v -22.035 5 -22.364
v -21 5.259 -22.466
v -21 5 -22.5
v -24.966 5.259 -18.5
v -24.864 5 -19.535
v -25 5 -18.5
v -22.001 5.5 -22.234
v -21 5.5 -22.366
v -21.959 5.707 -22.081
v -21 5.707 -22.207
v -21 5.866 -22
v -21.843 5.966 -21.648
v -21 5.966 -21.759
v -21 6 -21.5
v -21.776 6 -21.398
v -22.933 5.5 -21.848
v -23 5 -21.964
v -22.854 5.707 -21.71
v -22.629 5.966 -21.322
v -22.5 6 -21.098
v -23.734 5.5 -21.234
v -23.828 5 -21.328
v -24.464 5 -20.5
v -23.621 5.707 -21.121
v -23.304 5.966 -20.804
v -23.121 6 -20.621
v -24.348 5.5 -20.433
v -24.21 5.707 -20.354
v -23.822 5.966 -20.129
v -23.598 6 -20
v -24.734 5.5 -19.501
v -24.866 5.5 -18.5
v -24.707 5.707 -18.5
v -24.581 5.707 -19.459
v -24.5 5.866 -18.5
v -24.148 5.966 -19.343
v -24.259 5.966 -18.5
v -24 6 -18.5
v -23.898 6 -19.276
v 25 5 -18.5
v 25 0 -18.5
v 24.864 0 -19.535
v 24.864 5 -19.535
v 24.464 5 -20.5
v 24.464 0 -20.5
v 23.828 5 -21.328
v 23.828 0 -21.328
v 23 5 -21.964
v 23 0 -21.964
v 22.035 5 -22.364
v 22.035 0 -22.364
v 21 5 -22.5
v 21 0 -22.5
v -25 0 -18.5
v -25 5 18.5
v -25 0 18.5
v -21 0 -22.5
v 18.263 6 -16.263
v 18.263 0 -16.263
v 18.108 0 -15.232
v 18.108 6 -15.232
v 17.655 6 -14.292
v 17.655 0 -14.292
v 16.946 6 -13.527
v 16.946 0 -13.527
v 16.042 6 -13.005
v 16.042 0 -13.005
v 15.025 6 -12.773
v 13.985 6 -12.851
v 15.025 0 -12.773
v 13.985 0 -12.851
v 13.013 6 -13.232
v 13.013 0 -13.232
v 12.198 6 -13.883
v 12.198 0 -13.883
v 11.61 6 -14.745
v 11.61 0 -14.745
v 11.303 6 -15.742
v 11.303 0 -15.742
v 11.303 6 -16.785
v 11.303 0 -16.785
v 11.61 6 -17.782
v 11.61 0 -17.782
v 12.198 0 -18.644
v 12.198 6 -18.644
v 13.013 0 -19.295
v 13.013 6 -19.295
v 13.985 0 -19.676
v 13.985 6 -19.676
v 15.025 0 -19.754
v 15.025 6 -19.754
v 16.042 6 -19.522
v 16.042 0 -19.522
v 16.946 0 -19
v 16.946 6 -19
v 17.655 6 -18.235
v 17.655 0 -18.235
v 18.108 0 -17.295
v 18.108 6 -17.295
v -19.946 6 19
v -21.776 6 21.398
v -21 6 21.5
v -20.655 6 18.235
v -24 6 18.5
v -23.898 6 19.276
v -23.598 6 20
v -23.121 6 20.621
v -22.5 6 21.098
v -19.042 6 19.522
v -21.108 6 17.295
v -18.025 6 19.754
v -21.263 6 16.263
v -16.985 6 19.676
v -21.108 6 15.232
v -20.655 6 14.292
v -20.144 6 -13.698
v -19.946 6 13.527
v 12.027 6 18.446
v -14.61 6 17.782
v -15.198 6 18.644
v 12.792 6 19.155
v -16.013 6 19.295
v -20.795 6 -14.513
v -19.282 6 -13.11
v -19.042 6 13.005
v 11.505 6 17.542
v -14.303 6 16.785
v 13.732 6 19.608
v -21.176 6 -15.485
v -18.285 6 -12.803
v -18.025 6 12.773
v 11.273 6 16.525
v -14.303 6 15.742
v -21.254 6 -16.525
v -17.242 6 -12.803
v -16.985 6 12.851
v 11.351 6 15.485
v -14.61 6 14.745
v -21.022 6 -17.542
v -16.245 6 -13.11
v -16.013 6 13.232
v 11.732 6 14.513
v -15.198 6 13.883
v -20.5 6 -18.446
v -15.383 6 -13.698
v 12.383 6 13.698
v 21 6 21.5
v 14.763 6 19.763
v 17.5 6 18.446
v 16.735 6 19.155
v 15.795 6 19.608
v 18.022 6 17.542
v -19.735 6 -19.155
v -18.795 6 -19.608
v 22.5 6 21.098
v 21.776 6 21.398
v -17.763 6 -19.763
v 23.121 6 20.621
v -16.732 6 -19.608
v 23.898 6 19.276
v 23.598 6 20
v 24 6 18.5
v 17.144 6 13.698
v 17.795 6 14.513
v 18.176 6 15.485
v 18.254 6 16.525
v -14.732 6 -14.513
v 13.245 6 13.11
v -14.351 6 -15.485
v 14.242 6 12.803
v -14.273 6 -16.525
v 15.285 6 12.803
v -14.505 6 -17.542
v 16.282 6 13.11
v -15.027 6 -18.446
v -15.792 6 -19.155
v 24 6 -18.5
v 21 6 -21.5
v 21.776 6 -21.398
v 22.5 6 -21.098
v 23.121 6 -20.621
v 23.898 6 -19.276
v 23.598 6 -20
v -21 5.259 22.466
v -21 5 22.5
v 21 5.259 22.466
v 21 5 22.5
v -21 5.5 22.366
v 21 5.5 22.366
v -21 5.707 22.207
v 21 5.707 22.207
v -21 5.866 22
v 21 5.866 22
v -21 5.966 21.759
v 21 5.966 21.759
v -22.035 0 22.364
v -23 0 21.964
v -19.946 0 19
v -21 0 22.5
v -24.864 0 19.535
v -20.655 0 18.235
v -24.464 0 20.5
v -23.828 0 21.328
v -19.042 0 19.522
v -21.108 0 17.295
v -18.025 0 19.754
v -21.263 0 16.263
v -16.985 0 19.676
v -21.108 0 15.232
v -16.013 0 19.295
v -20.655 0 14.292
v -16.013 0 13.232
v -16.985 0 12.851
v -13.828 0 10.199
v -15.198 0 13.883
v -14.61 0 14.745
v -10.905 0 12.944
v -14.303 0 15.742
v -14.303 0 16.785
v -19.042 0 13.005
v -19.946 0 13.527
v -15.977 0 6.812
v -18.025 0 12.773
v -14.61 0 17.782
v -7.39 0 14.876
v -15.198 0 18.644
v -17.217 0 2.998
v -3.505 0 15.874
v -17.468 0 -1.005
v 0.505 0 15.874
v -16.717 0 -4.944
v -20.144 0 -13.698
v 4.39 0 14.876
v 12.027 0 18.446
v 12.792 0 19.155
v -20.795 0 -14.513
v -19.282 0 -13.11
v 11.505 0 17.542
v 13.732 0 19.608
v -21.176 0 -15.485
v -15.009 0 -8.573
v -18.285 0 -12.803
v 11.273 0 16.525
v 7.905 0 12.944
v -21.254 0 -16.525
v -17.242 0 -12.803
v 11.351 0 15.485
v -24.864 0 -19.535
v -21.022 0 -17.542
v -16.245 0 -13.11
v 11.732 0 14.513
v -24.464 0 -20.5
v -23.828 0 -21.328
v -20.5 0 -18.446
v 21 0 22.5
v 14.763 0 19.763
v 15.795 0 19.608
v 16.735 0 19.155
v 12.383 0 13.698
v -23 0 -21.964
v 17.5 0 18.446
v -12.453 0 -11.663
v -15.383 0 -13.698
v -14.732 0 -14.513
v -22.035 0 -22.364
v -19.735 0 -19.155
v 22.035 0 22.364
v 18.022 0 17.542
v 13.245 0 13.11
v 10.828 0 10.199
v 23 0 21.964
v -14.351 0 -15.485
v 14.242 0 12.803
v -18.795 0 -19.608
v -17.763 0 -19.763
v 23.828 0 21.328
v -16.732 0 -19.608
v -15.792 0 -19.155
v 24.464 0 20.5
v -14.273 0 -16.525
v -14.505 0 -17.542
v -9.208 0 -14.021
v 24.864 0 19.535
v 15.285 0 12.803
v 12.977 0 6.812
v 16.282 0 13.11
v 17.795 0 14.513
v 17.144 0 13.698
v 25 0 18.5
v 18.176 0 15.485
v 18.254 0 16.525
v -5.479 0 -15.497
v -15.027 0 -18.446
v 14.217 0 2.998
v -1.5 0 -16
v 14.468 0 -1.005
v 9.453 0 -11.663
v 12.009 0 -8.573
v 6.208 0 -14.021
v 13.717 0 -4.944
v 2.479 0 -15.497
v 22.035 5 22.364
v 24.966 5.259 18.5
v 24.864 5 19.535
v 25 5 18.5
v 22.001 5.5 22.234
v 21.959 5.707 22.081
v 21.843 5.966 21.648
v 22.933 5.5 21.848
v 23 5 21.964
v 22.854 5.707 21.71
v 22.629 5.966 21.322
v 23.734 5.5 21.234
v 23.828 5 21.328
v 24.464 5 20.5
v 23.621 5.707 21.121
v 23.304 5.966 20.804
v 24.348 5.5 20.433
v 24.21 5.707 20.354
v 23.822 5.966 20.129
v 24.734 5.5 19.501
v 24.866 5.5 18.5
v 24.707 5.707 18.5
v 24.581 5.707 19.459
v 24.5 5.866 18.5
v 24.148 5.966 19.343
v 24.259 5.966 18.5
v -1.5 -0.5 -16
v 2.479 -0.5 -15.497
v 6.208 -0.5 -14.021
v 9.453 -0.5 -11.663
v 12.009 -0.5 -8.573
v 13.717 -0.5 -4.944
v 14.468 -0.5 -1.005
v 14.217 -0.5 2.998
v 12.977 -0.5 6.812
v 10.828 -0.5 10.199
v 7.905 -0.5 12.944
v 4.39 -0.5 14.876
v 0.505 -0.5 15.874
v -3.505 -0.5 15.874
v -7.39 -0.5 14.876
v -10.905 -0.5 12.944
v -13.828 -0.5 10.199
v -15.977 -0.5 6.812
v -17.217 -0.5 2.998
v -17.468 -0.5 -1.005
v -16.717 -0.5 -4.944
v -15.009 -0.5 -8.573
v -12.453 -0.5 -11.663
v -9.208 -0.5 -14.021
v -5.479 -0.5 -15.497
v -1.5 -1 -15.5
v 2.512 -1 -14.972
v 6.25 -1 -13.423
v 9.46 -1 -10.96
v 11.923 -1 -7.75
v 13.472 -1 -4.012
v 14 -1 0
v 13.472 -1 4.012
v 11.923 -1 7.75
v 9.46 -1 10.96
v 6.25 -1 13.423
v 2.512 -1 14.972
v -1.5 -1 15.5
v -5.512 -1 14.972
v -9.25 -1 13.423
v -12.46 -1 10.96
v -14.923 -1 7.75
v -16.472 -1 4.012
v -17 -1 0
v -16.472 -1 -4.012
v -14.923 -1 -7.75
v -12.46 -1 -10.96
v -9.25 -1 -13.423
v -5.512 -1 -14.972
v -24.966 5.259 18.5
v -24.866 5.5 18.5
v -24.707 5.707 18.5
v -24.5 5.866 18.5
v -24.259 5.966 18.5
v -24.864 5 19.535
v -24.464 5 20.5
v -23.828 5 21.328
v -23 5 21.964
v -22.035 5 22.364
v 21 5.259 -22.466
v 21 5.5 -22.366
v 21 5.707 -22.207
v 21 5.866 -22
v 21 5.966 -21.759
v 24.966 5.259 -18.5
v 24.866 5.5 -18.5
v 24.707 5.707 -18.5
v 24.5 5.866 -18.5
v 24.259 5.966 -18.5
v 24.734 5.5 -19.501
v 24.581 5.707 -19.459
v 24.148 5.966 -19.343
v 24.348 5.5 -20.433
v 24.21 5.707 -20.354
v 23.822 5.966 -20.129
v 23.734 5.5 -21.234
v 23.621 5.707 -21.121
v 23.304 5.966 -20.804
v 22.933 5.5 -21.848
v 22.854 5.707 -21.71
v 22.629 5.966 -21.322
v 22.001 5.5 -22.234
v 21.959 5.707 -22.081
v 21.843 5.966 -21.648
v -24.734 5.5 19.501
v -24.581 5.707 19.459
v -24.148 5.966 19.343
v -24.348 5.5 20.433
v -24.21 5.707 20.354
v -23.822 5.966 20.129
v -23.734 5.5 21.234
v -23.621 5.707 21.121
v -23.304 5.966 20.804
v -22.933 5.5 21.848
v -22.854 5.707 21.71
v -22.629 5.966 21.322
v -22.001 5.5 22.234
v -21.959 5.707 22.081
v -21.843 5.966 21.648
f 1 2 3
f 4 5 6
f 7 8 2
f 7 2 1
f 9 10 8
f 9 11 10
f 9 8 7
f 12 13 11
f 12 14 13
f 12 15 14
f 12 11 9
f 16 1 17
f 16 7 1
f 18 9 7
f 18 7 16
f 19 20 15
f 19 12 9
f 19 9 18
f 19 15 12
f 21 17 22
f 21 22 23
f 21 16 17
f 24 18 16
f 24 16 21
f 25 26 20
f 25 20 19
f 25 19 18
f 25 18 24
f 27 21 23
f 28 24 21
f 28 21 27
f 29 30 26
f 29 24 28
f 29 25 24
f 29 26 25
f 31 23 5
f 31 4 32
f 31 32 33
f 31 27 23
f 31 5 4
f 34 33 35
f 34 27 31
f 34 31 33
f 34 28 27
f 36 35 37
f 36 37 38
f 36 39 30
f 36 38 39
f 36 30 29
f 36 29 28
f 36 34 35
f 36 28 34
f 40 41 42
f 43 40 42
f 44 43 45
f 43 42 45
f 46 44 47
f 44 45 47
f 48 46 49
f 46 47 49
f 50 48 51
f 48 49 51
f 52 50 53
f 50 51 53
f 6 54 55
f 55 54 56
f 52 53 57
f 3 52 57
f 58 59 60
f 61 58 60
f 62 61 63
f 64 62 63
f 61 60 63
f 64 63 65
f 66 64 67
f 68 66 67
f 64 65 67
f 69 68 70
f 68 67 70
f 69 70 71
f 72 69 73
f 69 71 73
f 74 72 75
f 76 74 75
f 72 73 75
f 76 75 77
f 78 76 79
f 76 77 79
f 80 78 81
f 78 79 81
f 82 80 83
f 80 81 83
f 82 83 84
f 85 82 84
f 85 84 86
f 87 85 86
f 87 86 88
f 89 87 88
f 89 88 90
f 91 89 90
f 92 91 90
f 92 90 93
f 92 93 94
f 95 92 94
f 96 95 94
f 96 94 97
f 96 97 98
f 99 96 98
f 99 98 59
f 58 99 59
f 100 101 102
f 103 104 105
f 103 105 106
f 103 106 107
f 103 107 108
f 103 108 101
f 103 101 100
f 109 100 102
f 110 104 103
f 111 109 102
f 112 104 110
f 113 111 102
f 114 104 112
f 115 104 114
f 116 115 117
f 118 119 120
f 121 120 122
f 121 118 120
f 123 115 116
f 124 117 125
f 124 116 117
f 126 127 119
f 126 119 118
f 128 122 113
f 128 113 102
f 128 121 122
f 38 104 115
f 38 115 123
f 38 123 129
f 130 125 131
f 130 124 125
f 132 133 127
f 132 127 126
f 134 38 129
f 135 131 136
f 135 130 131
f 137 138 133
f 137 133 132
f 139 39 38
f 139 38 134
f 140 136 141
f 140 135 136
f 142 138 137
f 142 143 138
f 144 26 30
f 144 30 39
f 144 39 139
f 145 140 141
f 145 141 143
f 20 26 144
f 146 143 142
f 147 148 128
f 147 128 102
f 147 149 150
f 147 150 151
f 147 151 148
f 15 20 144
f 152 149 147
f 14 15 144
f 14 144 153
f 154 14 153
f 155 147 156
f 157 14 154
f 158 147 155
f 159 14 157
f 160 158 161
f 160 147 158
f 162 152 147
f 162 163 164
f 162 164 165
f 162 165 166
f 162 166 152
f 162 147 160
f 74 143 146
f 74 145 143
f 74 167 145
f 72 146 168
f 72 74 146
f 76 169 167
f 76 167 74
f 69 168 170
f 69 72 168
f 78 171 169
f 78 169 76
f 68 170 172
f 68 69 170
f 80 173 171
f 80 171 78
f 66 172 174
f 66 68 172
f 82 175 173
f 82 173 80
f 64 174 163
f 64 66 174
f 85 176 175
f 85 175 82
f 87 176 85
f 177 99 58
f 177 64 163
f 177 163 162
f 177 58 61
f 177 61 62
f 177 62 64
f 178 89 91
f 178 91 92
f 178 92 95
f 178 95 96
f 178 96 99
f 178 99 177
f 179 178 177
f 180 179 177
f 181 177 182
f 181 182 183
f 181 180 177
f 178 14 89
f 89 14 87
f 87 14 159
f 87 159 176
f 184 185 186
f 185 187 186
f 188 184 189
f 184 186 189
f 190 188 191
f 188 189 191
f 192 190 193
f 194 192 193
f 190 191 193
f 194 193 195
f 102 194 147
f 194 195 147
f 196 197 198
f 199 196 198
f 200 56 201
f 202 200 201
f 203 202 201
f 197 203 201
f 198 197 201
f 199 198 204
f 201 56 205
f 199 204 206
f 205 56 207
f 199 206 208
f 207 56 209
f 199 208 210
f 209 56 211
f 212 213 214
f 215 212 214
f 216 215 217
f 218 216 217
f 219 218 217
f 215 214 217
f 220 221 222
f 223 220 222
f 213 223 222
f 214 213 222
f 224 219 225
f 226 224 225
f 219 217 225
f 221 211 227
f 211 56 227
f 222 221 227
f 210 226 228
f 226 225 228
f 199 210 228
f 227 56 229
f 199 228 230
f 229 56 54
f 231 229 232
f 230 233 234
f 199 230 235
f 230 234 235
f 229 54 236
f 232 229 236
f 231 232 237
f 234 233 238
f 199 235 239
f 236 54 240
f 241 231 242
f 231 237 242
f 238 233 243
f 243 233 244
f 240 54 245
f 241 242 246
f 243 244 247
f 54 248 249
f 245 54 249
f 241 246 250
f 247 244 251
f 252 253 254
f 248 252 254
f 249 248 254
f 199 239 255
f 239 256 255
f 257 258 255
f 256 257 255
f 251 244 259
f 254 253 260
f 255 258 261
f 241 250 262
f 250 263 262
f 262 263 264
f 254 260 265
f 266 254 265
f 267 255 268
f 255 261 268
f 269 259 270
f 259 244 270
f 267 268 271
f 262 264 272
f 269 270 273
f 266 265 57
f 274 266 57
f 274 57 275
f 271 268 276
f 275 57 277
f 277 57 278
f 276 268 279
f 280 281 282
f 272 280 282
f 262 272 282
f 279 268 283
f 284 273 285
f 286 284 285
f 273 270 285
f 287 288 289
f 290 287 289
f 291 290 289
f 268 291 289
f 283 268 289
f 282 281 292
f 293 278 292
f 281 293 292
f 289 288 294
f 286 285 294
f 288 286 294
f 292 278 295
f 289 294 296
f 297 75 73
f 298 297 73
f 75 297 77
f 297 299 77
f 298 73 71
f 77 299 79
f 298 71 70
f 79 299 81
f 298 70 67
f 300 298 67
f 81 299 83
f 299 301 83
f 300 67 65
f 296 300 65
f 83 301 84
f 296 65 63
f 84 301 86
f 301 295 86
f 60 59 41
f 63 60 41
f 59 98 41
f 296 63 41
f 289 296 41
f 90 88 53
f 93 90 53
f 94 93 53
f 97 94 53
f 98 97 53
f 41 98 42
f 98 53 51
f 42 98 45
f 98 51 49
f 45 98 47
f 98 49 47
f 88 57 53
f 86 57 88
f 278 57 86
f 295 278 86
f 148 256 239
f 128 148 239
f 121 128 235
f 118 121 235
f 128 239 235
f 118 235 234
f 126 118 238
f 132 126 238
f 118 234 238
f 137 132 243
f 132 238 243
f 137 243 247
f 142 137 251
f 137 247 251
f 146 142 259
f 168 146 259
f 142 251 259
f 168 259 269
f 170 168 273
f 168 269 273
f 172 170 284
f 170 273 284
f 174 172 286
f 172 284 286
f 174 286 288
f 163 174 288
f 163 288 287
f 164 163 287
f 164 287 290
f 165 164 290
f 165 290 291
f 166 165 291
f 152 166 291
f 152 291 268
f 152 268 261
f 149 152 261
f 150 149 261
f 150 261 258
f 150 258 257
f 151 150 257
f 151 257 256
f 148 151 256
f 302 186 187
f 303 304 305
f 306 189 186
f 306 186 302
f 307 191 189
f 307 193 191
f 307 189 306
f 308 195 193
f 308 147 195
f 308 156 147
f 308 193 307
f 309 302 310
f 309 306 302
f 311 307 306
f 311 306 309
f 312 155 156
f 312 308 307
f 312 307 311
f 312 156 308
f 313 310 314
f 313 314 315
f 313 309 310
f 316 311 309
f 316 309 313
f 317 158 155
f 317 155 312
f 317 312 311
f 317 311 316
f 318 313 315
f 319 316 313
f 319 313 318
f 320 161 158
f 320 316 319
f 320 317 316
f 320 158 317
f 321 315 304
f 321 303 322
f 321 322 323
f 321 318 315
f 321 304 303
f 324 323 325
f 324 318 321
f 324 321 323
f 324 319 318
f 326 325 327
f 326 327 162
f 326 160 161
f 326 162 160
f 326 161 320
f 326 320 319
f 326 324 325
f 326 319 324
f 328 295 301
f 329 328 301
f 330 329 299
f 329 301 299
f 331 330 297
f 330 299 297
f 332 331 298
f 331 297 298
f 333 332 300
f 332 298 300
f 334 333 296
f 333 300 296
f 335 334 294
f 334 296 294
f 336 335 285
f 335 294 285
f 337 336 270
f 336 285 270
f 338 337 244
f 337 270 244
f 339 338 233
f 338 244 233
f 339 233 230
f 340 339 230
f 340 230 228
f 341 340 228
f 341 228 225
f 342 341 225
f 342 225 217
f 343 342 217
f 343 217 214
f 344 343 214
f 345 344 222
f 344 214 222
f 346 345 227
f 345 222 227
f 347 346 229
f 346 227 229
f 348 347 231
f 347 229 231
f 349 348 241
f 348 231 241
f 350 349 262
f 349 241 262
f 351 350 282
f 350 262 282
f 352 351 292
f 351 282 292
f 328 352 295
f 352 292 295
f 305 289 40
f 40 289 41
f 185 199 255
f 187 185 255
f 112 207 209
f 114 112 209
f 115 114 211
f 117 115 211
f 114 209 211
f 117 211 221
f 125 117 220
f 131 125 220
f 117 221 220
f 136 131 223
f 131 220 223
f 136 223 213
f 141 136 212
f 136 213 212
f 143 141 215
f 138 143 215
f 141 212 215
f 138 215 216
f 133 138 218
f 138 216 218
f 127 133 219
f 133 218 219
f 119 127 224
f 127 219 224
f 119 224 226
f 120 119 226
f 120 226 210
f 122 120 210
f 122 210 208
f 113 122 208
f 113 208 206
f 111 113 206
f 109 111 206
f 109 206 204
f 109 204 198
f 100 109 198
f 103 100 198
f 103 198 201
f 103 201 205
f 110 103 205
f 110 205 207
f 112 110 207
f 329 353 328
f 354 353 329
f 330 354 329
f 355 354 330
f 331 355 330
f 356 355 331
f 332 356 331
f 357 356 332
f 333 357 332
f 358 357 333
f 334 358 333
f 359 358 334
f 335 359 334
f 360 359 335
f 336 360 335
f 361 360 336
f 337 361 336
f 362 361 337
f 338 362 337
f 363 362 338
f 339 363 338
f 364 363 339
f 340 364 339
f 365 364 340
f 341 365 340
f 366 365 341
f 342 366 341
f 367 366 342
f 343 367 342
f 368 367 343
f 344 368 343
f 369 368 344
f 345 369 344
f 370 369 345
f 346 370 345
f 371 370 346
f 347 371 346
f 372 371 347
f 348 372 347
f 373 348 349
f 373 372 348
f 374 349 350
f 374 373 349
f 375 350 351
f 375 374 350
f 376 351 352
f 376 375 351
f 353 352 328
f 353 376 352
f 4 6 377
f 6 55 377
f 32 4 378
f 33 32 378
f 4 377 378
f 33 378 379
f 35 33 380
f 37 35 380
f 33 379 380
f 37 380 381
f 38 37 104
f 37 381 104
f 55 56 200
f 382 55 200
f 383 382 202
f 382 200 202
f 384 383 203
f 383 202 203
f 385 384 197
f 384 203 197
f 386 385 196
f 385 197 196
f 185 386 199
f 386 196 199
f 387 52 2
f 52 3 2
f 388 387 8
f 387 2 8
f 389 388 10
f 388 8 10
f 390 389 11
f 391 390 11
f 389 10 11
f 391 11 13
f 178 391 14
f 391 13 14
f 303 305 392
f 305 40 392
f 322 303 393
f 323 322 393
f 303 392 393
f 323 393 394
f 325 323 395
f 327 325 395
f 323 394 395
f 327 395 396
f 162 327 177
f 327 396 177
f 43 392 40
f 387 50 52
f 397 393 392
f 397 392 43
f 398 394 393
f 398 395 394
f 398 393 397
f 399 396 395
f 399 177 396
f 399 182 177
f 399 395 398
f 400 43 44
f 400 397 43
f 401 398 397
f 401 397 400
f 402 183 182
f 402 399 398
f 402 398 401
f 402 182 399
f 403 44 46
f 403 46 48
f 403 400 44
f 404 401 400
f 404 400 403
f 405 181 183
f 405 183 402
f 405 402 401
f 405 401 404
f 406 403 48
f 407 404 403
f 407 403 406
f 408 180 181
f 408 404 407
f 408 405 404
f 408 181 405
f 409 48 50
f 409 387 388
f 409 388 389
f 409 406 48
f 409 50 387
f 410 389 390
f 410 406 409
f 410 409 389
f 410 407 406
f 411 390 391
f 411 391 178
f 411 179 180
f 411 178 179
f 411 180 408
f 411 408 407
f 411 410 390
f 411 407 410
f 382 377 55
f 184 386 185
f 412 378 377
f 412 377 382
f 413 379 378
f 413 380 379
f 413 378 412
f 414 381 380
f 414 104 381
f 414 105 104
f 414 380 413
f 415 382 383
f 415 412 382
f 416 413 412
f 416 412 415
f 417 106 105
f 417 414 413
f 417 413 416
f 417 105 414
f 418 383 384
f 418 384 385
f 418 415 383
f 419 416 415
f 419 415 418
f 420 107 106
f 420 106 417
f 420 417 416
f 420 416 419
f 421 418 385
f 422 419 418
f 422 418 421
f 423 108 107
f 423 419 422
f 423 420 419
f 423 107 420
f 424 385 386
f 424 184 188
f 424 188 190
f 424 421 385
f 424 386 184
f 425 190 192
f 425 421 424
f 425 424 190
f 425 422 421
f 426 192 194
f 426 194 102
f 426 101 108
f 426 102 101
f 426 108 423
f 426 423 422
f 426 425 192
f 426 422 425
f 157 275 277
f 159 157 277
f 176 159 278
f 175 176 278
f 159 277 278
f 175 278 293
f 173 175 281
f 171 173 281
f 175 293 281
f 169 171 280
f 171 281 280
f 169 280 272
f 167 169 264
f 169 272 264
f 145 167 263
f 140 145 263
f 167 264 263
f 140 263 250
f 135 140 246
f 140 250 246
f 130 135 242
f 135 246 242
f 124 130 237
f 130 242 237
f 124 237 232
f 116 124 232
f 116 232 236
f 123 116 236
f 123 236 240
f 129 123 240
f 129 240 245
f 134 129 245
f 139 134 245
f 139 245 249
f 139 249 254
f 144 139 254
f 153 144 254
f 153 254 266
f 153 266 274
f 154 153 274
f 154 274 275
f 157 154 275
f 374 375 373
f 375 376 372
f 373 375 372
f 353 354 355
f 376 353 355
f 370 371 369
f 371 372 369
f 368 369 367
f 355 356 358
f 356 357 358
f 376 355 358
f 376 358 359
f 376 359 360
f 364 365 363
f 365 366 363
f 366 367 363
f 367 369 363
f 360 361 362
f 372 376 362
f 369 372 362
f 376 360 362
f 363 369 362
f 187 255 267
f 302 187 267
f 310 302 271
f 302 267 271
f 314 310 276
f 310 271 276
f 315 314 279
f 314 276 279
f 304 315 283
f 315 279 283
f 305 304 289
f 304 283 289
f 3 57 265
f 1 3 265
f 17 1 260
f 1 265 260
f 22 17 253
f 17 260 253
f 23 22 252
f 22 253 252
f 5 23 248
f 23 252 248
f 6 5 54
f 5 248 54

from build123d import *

# Parameters (mm, degrees)
BOSS_EXTRUDE1_DEPTH = 6
FILLET1_R           = 1
SKETCH2_R           = 16
BOSS_EXTRUDE2_DEPTH = 0.5
SKETCH3_R           = 15
BOSS_EXTRUDE3_DEPTH = 0.5
FILLET2_SIZE        = 1
SKETCH5_R           = 3.5
CUT_EXTRUDE2_DEPTH  = 10
CIRPATTERN2_COUNT   = 4


with BuildPart() as part:
    # Sketch1 → Boss-Extrude1 (new body)
    with BuildSketch(Plane(origin=(0, 0, 0), x_dir=(1, 0, 0), z_dir=(0, 1, 0))):
        with BuildLine():
            Line((-21, -22.5), (21, -22.5))
            ThreePointArc((21, -22.5), (23.828427125, -21.328427125), (25, -18.5))
            Line((25, -18.5), (25, 18.5))
            ThreePointArc((25, 18.5), (23.828427125, 21.328427125), (21, 22.5))
            Line((21, 22.5), (-21, 22.5))
            ThreePointArc((-21, 22.5), (-23.828427125, 21.328427125), (-25, 18.5))
            Line((-25, 18.5), (-25, -18.5))
            ThreePointArc((-25, -18.5), (-23.828427125, -21.328427125), (-21, -22.5))
        make_face()
    extrude(amount=BOSS_EXTRUDE1_DEPTH)

    # Fillet1
    fillet1_edges = [part.edges().sort_by_distance(p)[0] for p in [
        (23.828427125, 6, -21.328427125),
        (0, 6, -22.5),
        (-23.828427125, 6, -21.328427125),
        (-25, 6, 0),
        (-23.828427125, 6, 21.328427125),
        (0, 6, 22.5),
        (23.828427125, 6, 21.328427125),
        (25, 6, 0),
    ]]
    fillet(fillet1_edges, radius=FILLET1_R)

    # Sketch2 → Boss-Extrude2 (add)
    with BuildSketch(Plane.XZ):
        with Locations(Location((-1.5, 0, 0), (0, 0, 270))):
            Circle(SKETCH2_R)
    extrude(amount=BOSS_EXTRUDE2_DEPTH)

    # Sketch3 → Boss-Extrude3 (add)
    with BuildSketch(Plane(origin=(0, -0.5, 0), x_dir=(-1, 0, 0), z_dir=(0, -1, 0))):
        with Locations(Location((1.5, 0, 0), (0, 0, 90))):
            Circle(SKETCH3_R)
    extrude(amount=BOSS_EXTRUDE3_DEPTH)

    # Fillet2
    # the kernel refuses this chamfer: 1 mm, written as the material it adds along each edge
    with BuildSketch(Plane(origin=(-1.5, -0.5, 0), x_dir=(0, 0, -1), z_dir=(-1, 0, 0))) as fillet2_piece_1_section:
        Polygon((15 + FILLET2_SIZE, 0), (15, FILLET2_SIZE), (15, 0), align=None)
    fillet2_piece_1 = revolve(axis=Axis((-1.5, -0.5, 0), (0, -1, 0)), mode=Mode.PRIVATE)
    fillet2_piece_1 = fillet2_piece_1 & Plane(origin=(-1.5, -0.725925615, 0), x_dir=(0, 0, -1), z_dir=(0, 1, 0)) * Cylinder(16, 64, mode=Mode.PRIVATE)
    fillet2_piece_1 = split(fillet2_piece_1, bisect_by=Plane(origin=(-1.5, -1, 15.725925615), z_dir=(0, 1, 0)), keep=Keep.TOP, mode=Mode.PRIVATE)
    add(fillet2_piece_1)

    # Sketch5 → Cut-Extrude2 (cut)
    with BuildSketch(Plane(origin=(0, 0, 0), x_dir=(-1, 0, 0), z_dir=(0, -1, 0))):
        with Locations(Location((17.763455967, 16.263455967, 0), (0, 0, 90))):
            Circle(SKETCH5_R)
    cut_extrude2 = extrude(amount=-CUT_EXTRUDE2_DEPTH, mode=Mode.SUBTRACT)

    # CirPattern2: Cut-Extrude2 ×4 about axis
    cirpattern2_axis = Axis((-1.5, 0, 0), (0, 1, 0))
    for i in range(1, CIRPATTERN2_COUNT):
        add(cut_extrude2.rotate(cirpattern2_axis, i * 360 / CIRPATTERN2_COUNT), mode=Mode.SUBTRACT)


solid = part.part
